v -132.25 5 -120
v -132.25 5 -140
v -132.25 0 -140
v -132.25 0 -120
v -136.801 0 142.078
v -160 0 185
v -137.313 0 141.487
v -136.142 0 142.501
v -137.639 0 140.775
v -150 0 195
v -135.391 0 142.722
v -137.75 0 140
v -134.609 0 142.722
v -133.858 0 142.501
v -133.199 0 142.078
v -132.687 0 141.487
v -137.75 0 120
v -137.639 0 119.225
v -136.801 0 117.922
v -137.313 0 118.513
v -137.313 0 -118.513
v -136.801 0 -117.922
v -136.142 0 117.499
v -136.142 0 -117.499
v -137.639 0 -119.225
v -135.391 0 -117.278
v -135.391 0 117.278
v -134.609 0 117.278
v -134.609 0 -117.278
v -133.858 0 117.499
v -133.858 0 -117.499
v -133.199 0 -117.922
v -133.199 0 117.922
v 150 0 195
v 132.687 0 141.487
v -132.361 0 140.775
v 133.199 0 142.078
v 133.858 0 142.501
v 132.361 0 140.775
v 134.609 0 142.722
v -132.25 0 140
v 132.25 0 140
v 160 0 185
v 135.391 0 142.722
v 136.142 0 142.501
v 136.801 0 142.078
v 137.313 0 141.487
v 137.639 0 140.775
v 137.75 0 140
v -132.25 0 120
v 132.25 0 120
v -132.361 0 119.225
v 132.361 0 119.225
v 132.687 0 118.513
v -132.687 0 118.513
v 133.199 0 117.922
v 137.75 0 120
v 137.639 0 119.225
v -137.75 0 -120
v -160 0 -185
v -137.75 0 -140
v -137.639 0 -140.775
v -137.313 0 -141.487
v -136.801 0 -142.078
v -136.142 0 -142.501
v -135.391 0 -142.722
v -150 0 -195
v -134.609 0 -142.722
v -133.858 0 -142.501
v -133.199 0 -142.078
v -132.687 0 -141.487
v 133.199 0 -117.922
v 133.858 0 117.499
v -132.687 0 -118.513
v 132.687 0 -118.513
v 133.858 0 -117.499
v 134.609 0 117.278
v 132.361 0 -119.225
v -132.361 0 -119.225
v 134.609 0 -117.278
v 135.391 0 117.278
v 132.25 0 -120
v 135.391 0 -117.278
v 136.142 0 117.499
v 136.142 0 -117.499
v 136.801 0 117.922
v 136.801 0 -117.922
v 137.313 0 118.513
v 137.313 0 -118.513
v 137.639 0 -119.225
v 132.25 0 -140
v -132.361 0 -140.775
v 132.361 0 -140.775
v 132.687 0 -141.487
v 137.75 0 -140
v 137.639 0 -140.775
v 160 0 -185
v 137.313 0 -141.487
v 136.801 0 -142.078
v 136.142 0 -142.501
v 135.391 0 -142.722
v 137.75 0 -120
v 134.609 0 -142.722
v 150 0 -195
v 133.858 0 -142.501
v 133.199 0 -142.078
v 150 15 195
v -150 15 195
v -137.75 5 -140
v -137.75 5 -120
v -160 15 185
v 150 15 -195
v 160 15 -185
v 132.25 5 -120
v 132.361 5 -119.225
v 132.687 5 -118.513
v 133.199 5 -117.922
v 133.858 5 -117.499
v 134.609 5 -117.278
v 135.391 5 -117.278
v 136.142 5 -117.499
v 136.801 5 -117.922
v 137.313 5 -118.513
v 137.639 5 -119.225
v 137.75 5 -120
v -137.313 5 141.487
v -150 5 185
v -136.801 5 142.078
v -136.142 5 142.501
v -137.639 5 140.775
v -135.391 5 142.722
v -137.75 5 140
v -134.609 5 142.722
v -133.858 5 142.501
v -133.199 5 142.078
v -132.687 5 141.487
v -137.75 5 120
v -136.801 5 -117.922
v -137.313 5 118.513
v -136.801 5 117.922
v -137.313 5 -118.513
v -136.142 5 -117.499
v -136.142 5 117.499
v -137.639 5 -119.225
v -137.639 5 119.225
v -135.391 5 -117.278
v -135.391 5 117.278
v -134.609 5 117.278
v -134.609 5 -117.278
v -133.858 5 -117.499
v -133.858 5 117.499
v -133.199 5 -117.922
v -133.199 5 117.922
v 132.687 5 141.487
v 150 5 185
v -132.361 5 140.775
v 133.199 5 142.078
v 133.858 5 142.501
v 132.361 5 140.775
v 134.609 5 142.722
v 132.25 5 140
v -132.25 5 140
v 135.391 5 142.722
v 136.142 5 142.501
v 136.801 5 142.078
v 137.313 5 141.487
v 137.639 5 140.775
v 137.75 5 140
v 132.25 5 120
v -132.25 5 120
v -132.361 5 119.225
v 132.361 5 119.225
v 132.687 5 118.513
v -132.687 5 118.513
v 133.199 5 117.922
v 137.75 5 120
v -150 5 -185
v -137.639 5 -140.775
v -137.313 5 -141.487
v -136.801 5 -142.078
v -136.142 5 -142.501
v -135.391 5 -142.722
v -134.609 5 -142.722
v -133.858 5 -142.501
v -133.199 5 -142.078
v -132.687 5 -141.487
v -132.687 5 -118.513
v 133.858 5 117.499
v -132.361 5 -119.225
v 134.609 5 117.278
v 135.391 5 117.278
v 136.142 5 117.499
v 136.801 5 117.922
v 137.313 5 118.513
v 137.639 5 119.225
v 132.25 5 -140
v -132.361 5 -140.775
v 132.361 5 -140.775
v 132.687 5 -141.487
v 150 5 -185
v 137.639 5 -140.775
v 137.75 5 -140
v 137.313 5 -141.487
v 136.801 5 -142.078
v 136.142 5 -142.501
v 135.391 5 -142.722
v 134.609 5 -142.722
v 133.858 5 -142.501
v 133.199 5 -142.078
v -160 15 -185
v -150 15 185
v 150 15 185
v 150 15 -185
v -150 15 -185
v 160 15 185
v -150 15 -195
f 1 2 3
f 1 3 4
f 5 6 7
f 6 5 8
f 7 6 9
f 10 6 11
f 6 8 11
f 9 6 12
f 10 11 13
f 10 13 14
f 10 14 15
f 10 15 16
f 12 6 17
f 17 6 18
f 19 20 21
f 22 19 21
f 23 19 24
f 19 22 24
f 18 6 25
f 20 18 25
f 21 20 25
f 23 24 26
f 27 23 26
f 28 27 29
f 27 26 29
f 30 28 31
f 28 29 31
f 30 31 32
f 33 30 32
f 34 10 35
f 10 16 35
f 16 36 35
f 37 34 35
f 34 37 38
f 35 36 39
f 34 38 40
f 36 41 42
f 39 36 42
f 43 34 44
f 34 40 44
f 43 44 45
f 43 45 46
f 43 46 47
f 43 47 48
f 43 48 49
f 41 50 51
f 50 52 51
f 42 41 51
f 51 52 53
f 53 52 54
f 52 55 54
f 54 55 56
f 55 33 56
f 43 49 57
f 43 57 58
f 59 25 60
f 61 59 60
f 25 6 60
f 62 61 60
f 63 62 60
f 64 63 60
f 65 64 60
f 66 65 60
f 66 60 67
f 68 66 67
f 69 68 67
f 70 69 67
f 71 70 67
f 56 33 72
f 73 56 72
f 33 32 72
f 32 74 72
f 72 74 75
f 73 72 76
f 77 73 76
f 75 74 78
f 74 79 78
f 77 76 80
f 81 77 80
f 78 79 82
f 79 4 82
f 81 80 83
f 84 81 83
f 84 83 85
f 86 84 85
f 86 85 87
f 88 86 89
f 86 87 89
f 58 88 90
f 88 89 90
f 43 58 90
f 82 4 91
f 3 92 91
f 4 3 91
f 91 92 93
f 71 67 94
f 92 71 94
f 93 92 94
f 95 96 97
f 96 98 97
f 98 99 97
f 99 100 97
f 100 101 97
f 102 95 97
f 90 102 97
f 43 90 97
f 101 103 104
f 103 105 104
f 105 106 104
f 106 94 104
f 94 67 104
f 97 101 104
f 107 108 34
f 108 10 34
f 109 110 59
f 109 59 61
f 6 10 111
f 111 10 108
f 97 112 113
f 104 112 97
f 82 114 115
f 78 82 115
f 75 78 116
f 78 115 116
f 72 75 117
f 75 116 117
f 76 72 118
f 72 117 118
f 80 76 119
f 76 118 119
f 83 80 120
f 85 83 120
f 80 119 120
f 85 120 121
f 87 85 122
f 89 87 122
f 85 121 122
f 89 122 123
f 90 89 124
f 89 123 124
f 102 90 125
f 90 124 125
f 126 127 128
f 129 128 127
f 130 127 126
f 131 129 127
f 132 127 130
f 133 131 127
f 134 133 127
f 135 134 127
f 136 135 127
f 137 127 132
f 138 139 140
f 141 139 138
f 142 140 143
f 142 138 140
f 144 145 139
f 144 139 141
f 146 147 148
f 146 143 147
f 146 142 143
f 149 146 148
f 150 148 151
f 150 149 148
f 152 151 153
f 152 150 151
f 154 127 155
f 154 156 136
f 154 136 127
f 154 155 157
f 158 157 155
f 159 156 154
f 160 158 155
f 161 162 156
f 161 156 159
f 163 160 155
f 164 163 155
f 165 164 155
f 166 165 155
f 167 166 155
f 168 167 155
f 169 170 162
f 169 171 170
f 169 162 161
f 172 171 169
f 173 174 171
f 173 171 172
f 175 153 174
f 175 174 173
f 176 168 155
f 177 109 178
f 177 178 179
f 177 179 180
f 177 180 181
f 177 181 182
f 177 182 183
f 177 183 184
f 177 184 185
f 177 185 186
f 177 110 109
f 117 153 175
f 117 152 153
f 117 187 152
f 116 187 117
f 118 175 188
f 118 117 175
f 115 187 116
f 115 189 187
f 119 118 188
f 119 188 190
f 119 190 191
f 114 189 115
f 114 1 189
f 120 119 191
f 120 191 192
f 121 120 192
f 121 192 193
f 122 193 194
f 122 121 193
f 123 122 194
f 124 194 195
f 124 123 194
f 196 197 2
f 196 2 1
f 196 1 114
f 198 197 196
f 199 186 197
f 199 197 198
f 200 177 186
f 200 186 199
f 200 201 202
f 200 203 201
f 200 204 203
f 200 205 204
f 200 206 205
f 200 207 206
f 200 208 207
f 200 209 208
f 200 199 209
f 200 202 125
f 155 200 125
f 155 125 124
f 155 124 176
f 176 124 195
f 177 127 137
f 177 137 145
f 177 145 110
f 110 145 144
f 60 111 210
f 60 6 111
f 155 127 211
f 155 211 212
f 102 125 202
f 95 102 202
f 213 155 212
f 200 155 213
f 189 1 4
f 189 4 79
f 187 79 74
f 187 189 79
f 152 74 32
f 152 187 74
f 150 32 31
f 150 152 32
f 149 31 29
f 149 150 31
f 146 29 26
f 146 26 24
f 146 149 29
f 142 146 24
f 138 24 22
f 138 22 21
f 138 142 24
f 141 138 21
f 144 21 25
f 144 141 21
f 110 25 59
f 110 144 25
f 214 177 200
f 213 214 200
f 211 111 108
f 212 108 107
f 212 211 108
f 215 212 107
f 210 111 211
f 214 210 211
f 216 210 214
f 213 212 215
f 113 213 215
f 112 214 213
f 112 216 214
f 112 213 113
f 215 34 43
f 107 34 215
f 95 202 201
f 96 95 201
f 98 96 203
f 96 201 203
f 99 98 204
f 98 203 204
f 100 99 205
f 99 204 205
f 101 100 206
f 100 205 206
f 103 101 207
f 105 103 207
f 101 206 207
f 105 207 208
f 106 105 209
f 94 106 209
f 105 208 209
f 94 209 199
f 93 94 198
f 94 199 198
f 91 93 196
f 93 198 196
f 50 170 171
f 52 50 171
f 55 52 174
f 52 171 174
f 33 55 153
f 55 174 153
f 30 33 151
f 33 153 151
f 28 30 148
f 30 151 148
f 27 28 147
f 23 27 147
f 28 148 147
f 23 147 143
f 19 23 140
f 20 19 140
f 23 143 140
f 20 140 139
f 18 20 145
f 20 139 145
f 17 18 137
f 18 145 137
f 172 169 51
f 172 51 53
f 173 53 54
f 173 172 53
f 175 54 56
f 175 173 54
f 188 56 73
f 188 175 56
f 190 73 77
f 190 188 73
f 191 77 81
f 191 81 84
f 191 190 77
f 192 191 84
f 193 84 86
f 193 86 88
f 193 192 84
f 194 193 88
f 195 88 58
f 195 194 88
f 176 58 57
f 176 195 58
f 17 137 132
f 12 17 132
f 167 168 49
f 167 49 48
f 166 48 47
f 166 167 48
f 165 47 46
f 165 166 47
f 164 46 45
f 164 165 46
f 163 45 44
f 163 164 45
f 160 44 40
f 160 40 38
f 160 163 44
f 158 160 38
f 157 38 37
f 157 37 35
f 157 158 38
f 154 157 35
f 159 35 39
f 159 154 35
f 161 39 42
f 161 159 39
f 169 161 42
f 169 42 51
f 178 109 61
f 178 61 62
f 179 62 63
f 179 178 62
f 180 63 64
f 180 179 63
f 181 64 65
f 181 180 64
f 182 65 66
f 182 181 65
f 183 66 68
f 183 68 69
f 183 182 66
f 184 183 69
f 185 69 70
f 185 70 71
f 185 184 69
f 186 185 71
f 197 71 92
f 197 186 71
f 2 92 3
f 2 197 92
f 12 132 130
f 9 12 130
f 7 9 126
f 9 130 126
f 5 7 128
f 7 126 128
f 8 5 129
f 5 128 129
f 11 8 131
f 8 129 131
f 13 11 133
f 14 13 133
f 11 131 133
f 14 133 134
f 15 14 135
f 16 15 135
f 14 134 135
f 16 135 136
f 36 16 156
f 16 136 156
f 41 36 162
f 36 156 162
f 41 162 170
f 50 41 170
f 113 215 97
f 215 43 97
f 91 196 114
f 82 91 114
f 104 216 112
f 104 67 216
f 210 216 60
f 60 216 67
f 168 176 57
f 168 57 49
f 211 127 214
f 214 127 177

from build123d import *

# Parameters (mm, degrees)
SKETCH_1_W          = 320
SKETCH_1_H          = 390
EXTRUDE_1_DEPTH     = 5
CUT_EXTRUDE_1_DEPTH = 5
SKETCH_3_W          = 320
SKETCH_3_H          = 390
SKETCH_3_W_2        = 300
SKETCH_3_H_2        = 370
EXTRUDE_2_DEPTH     = 15
CHAMFER_1_SIZE      = 10


with BuildPart() as part:
    # 草图1 → 凸台-拉伸1 (new body)
    with BuildSketch(Plane(origin=(0, 0, 0), x_dir=(1, 0, 0), z_dir=(0, 1, 0))):
        Rectangle(SKETCH_1_W, SKETCH_1_H)
    extrude(amount=EXTRUDE_1_DEPTH)

    # 草图2 → 切除-拉伸1 (cut)
    with BuildSketch(Plane(origin=(0, 5, 0), x_dir=(1, 0, 0), z_dir=(0, 1, 0))):
        with BuildLine():
            Line((-132.25, 140), (-132.25, 120))
            ThreePointArc((-132.25, 120), (-135, 117.25), (-137.75, 120))
            Line((-137.75, 120), (-137.75, 140))
            ThreePointArc((-137.75, 140), (-135, 142.75), (-132.25, 140))
        make_face()
        with BuildLine():
            Line((-132.25, -140), (-132.25, -120))
            ThreePointArc((-132.25, -120), (-135, -117.25), (-137.75, -120))
            Line((-137.75, -120), (-137.75, -140))
            ThreePointArc((-137.75, -140), (-135, -142.75), (-132.25, -140))
        make_face()
        with BuildLine():
            Line((132.25, 140), (132.25, 120))
            ThreePointArc((132.25, 120), (135, 117.25), (137.75, 120))
            Line((137.75, 120), (137.75, 140))
            ThreePointArc((137.75, 140), (135, 142.75), (132.25, 140))
        make_face()
        with BuildLine():
            Line((132.25, -140), (132.25, -120))
            ThreePointArc((132.25, -120), (135, -117.25), (137.75, -120))
            Line((137.75, -120), (137.75, -140))
            ThreePointArc((137.75, -140), (135, -142.75), (132.25, -140))
        make_face()
    extrude(amount=-CUT_EXTRUDE_1_DEPTH, mode=Mode.SUBTRACT)

    # 草图3 → 凸台-拉伸2 (add)
    with BuildSketch(Plane(origin=(0, 0, 0), x_dir=(1, 0, 0), z_dir=(0, 1, 0))):
        Rectangle(SKETCH_3_W, SKETCH_3_H)
        Rectangle(SKETCH_3_W_2, SKETCH_3_H_2, mode=Mode.SUBTRACT)
    extrude(amount=EXTRUDE_2_DEPTH)

    # 倒角1
    chamfer_1_edges = [part.edges().sort_by_distance(p)[0] for p in [
        (-160, 7.5, -195),
        (-160, 7.5, 195),
        (160, 7.5, 195),
        (160, 7.5, -195),
    ]]
    chamfer(chamfer_1_edges, length=CHAMFER_1_SIZE)


solid = part.part
